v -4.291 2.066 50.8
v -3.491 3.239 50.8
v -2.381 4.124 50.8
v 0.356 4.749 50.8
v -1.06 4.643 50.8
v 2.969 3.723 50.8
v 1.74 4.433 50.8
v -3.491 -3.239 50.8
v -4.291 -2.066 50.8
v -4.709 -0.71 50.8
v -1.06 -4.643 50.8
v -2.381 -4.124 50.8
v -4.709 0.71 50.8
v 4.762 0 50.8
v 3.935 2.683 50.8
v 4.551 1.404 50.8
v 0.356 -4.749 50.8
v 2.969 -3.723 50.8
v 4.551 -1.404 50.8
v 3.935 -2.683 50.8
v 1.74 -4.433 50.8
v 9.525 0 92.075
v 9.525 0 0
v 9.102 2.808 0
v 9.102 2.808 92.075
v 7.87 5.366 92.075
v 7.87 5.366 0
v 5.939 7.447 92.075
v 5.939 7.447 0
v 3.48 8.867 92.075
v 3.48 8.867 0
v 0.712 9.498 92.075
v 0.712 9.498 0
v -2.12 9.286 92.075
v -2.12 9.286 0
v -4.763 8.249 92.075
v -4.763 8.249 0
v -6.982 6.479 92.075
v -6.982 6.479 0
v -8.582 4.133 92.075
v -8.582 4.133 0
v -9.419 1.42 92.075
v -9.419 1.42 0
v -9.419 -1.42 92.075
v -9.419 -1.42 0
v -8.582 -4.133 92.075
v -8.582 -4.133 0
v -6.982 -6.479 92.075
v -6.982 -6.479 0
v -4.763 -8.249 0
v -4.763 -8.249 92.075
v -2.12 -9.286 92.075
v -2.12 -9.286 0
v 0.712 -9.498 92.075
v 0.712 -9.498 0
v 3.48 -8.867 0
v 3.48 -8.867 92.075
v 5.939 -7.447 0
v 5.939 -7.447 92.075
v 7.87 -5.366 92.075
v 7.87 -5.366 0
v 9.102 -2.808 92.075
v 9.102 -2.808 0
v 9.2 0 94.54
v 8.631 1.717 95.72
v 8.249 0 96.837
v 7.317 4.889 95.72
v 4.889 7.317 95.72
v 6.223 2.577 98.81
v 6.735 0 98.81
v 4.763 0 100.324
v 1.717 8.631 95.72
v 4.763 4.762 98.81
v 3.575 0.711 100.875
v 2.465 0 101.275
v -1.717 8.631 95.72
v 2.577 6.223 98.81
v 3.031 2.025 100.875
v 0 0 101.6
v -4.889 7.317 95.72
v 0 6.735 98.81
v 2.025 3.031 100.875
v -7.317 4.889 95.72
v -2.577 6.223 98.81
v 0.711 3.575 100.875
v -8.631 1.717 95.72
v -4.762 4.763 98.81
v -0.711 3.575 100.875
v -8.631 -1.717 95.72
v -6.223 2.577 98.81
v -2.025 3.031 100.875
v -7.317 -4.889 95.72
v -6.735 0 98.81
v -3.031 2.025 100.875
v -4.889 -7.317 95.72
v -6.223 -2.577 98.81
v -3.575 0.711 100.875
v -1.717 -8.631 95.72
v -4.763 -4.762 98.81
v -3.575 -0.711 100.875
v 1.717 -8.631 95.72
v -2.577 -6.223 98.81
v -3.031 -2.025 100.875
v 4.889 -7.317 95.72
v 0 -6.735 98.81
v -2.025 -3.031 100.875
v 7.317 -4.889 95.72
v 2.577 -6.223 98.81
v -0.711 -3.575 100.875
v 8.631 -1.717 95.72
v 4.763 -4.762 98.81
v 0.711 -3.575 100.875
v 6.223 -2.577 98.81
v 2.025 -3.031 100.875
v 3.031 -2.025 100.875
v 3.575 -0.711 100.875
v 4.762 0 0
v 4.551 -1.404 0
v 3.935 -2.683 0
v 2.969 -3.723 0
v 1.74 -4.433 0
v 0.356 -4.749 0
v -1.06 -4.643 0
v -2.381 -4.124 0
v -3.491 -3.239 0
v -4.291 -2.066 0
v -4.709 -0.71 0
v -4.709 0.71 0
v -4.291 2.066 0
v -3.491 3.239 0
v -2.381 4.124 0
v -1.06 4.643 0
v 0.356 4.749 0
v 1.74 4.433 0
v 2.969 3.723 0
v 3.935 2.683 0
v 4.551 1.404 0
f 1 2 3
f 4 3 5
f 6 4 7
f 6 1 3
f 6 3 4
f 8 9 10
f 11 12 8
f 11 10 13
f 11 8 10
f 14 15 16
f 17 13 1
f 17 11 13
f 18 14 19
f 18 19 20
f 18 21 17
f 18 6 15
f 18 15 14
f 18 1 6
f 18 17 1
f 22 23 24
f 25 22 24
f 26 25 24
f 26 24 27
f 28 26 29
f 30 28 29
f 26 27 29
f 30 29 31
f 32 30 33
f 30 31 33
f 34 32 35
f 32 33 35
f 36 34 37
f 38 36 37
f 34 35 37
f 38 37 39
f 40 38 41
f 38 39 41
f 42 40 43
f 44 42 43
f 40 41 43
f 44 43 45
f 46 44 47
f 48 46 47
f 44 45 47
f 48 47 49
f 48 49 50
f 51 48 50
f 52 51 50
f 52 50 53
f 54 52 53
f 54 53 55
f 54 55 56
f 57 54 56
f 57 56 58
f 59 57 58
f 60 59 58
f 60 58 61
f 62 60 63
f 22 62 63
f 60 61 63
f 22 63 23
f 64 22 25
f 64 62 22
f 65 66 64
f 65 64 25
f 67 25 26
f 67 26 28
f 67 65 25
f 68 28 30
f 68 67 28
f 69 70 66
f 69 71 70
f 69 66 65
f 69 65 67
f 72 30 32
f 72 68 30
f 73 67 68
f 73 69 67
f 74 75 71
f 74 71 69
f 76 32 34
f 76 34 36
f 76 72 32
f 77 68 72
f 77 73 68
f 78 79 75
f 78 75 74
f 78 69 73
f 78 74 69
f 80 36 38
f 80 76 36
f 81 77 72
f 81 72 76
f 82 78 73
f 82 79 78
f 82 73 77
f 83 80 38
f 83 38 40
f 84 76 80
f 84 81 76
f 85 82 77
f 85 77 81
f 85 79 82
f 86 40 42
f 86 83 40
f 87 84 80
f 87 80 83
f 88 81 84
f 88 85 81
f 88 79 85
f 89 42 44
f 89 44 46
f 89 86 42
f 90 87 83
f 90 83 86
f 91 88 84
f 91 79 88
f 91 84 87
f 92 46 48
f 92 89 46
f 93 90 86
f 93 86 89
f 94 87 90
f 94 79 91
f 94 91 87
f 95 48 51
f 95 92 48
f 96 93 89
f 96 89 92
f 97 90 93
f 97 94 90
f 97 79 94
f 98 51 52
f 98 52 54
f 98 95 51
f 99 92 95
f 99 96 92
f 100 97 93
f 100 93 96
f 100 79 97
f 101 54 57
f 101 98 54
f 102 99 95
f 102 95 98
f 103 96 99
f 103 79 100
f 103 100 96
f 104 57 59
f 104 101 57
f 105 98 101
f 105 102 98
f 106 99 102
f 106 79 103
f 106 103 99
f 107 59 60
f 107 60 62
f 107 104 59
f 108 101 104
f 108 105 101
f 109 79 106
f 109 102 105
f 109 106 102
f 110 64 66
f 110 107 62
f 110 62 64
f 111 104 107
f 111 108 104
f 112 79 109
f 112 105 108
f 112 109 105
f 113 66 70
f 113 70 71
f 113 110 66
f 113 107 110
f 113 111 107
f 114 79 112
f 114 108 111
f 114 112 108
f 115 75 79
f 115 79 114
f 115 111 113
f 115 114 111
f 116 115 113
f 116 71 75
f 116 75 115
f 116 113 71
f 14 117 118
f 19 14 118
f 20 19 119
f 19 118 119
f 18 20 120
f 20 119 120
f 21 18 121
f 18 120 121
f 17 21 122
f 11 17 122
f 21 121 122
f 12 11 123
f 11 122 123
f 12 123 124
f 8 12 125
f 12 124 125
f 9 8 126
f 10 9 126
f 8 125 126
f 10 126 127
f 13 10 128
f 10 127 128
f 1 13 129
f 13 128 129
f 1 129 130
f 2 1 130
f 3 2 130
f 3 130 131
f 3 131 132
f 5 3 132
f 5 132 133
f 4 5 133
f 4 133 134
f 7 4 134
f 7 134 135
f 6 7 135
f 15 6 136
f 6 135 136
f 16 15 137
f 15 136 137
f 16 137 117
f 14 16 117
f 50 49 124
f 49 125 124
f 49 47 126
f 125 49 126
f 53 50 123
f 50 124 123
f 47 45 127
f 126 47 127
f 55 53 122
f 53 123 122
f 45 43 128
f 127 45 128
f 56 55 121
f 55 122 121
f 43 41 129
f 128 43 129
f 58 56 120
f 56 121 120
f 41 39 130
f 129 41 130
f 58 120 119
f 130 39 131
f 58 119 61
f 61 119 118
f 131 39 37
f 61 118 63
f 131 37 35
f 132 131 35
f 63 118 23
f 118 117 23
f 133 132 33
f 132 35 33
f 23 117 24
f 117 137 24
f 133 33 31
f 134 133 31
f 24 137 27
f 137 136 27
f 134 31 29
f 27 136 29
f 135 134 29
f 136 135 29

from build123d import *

# Parameters (mm, degrees)
F0_R     = 9.525
F1_DEPTH = 101.6
F2_R     = 4.7625
F3_DEPTH = 50.8
F4_R     = 9.525


with BuildPart() as f1:
    # F0 (on Top) → F1 (new body)
    with BuildSketch(Plane.XY):
        Circle(F0_R)
    extrude(amount=F1_DEPTH)

    # F2 (on face) → F3 (cut)
    with BuildSketch(Plane(origin=(0, 0, 0), x_dir=(1, 0, 0), z_dir=(0, 0, -1))):
        Circle(F2_R)
    extrude(amount=-F3_DEPTH, mode=Mode.SUBTRACT)

    # F4
    f4_edges = [f1.edges().sort_by_distance(p)[0] for p in [
        (-9.525, 0, 101.6),
    ]]
    fillet(f4_edges, radius=F4_R)


solid = f1.part
